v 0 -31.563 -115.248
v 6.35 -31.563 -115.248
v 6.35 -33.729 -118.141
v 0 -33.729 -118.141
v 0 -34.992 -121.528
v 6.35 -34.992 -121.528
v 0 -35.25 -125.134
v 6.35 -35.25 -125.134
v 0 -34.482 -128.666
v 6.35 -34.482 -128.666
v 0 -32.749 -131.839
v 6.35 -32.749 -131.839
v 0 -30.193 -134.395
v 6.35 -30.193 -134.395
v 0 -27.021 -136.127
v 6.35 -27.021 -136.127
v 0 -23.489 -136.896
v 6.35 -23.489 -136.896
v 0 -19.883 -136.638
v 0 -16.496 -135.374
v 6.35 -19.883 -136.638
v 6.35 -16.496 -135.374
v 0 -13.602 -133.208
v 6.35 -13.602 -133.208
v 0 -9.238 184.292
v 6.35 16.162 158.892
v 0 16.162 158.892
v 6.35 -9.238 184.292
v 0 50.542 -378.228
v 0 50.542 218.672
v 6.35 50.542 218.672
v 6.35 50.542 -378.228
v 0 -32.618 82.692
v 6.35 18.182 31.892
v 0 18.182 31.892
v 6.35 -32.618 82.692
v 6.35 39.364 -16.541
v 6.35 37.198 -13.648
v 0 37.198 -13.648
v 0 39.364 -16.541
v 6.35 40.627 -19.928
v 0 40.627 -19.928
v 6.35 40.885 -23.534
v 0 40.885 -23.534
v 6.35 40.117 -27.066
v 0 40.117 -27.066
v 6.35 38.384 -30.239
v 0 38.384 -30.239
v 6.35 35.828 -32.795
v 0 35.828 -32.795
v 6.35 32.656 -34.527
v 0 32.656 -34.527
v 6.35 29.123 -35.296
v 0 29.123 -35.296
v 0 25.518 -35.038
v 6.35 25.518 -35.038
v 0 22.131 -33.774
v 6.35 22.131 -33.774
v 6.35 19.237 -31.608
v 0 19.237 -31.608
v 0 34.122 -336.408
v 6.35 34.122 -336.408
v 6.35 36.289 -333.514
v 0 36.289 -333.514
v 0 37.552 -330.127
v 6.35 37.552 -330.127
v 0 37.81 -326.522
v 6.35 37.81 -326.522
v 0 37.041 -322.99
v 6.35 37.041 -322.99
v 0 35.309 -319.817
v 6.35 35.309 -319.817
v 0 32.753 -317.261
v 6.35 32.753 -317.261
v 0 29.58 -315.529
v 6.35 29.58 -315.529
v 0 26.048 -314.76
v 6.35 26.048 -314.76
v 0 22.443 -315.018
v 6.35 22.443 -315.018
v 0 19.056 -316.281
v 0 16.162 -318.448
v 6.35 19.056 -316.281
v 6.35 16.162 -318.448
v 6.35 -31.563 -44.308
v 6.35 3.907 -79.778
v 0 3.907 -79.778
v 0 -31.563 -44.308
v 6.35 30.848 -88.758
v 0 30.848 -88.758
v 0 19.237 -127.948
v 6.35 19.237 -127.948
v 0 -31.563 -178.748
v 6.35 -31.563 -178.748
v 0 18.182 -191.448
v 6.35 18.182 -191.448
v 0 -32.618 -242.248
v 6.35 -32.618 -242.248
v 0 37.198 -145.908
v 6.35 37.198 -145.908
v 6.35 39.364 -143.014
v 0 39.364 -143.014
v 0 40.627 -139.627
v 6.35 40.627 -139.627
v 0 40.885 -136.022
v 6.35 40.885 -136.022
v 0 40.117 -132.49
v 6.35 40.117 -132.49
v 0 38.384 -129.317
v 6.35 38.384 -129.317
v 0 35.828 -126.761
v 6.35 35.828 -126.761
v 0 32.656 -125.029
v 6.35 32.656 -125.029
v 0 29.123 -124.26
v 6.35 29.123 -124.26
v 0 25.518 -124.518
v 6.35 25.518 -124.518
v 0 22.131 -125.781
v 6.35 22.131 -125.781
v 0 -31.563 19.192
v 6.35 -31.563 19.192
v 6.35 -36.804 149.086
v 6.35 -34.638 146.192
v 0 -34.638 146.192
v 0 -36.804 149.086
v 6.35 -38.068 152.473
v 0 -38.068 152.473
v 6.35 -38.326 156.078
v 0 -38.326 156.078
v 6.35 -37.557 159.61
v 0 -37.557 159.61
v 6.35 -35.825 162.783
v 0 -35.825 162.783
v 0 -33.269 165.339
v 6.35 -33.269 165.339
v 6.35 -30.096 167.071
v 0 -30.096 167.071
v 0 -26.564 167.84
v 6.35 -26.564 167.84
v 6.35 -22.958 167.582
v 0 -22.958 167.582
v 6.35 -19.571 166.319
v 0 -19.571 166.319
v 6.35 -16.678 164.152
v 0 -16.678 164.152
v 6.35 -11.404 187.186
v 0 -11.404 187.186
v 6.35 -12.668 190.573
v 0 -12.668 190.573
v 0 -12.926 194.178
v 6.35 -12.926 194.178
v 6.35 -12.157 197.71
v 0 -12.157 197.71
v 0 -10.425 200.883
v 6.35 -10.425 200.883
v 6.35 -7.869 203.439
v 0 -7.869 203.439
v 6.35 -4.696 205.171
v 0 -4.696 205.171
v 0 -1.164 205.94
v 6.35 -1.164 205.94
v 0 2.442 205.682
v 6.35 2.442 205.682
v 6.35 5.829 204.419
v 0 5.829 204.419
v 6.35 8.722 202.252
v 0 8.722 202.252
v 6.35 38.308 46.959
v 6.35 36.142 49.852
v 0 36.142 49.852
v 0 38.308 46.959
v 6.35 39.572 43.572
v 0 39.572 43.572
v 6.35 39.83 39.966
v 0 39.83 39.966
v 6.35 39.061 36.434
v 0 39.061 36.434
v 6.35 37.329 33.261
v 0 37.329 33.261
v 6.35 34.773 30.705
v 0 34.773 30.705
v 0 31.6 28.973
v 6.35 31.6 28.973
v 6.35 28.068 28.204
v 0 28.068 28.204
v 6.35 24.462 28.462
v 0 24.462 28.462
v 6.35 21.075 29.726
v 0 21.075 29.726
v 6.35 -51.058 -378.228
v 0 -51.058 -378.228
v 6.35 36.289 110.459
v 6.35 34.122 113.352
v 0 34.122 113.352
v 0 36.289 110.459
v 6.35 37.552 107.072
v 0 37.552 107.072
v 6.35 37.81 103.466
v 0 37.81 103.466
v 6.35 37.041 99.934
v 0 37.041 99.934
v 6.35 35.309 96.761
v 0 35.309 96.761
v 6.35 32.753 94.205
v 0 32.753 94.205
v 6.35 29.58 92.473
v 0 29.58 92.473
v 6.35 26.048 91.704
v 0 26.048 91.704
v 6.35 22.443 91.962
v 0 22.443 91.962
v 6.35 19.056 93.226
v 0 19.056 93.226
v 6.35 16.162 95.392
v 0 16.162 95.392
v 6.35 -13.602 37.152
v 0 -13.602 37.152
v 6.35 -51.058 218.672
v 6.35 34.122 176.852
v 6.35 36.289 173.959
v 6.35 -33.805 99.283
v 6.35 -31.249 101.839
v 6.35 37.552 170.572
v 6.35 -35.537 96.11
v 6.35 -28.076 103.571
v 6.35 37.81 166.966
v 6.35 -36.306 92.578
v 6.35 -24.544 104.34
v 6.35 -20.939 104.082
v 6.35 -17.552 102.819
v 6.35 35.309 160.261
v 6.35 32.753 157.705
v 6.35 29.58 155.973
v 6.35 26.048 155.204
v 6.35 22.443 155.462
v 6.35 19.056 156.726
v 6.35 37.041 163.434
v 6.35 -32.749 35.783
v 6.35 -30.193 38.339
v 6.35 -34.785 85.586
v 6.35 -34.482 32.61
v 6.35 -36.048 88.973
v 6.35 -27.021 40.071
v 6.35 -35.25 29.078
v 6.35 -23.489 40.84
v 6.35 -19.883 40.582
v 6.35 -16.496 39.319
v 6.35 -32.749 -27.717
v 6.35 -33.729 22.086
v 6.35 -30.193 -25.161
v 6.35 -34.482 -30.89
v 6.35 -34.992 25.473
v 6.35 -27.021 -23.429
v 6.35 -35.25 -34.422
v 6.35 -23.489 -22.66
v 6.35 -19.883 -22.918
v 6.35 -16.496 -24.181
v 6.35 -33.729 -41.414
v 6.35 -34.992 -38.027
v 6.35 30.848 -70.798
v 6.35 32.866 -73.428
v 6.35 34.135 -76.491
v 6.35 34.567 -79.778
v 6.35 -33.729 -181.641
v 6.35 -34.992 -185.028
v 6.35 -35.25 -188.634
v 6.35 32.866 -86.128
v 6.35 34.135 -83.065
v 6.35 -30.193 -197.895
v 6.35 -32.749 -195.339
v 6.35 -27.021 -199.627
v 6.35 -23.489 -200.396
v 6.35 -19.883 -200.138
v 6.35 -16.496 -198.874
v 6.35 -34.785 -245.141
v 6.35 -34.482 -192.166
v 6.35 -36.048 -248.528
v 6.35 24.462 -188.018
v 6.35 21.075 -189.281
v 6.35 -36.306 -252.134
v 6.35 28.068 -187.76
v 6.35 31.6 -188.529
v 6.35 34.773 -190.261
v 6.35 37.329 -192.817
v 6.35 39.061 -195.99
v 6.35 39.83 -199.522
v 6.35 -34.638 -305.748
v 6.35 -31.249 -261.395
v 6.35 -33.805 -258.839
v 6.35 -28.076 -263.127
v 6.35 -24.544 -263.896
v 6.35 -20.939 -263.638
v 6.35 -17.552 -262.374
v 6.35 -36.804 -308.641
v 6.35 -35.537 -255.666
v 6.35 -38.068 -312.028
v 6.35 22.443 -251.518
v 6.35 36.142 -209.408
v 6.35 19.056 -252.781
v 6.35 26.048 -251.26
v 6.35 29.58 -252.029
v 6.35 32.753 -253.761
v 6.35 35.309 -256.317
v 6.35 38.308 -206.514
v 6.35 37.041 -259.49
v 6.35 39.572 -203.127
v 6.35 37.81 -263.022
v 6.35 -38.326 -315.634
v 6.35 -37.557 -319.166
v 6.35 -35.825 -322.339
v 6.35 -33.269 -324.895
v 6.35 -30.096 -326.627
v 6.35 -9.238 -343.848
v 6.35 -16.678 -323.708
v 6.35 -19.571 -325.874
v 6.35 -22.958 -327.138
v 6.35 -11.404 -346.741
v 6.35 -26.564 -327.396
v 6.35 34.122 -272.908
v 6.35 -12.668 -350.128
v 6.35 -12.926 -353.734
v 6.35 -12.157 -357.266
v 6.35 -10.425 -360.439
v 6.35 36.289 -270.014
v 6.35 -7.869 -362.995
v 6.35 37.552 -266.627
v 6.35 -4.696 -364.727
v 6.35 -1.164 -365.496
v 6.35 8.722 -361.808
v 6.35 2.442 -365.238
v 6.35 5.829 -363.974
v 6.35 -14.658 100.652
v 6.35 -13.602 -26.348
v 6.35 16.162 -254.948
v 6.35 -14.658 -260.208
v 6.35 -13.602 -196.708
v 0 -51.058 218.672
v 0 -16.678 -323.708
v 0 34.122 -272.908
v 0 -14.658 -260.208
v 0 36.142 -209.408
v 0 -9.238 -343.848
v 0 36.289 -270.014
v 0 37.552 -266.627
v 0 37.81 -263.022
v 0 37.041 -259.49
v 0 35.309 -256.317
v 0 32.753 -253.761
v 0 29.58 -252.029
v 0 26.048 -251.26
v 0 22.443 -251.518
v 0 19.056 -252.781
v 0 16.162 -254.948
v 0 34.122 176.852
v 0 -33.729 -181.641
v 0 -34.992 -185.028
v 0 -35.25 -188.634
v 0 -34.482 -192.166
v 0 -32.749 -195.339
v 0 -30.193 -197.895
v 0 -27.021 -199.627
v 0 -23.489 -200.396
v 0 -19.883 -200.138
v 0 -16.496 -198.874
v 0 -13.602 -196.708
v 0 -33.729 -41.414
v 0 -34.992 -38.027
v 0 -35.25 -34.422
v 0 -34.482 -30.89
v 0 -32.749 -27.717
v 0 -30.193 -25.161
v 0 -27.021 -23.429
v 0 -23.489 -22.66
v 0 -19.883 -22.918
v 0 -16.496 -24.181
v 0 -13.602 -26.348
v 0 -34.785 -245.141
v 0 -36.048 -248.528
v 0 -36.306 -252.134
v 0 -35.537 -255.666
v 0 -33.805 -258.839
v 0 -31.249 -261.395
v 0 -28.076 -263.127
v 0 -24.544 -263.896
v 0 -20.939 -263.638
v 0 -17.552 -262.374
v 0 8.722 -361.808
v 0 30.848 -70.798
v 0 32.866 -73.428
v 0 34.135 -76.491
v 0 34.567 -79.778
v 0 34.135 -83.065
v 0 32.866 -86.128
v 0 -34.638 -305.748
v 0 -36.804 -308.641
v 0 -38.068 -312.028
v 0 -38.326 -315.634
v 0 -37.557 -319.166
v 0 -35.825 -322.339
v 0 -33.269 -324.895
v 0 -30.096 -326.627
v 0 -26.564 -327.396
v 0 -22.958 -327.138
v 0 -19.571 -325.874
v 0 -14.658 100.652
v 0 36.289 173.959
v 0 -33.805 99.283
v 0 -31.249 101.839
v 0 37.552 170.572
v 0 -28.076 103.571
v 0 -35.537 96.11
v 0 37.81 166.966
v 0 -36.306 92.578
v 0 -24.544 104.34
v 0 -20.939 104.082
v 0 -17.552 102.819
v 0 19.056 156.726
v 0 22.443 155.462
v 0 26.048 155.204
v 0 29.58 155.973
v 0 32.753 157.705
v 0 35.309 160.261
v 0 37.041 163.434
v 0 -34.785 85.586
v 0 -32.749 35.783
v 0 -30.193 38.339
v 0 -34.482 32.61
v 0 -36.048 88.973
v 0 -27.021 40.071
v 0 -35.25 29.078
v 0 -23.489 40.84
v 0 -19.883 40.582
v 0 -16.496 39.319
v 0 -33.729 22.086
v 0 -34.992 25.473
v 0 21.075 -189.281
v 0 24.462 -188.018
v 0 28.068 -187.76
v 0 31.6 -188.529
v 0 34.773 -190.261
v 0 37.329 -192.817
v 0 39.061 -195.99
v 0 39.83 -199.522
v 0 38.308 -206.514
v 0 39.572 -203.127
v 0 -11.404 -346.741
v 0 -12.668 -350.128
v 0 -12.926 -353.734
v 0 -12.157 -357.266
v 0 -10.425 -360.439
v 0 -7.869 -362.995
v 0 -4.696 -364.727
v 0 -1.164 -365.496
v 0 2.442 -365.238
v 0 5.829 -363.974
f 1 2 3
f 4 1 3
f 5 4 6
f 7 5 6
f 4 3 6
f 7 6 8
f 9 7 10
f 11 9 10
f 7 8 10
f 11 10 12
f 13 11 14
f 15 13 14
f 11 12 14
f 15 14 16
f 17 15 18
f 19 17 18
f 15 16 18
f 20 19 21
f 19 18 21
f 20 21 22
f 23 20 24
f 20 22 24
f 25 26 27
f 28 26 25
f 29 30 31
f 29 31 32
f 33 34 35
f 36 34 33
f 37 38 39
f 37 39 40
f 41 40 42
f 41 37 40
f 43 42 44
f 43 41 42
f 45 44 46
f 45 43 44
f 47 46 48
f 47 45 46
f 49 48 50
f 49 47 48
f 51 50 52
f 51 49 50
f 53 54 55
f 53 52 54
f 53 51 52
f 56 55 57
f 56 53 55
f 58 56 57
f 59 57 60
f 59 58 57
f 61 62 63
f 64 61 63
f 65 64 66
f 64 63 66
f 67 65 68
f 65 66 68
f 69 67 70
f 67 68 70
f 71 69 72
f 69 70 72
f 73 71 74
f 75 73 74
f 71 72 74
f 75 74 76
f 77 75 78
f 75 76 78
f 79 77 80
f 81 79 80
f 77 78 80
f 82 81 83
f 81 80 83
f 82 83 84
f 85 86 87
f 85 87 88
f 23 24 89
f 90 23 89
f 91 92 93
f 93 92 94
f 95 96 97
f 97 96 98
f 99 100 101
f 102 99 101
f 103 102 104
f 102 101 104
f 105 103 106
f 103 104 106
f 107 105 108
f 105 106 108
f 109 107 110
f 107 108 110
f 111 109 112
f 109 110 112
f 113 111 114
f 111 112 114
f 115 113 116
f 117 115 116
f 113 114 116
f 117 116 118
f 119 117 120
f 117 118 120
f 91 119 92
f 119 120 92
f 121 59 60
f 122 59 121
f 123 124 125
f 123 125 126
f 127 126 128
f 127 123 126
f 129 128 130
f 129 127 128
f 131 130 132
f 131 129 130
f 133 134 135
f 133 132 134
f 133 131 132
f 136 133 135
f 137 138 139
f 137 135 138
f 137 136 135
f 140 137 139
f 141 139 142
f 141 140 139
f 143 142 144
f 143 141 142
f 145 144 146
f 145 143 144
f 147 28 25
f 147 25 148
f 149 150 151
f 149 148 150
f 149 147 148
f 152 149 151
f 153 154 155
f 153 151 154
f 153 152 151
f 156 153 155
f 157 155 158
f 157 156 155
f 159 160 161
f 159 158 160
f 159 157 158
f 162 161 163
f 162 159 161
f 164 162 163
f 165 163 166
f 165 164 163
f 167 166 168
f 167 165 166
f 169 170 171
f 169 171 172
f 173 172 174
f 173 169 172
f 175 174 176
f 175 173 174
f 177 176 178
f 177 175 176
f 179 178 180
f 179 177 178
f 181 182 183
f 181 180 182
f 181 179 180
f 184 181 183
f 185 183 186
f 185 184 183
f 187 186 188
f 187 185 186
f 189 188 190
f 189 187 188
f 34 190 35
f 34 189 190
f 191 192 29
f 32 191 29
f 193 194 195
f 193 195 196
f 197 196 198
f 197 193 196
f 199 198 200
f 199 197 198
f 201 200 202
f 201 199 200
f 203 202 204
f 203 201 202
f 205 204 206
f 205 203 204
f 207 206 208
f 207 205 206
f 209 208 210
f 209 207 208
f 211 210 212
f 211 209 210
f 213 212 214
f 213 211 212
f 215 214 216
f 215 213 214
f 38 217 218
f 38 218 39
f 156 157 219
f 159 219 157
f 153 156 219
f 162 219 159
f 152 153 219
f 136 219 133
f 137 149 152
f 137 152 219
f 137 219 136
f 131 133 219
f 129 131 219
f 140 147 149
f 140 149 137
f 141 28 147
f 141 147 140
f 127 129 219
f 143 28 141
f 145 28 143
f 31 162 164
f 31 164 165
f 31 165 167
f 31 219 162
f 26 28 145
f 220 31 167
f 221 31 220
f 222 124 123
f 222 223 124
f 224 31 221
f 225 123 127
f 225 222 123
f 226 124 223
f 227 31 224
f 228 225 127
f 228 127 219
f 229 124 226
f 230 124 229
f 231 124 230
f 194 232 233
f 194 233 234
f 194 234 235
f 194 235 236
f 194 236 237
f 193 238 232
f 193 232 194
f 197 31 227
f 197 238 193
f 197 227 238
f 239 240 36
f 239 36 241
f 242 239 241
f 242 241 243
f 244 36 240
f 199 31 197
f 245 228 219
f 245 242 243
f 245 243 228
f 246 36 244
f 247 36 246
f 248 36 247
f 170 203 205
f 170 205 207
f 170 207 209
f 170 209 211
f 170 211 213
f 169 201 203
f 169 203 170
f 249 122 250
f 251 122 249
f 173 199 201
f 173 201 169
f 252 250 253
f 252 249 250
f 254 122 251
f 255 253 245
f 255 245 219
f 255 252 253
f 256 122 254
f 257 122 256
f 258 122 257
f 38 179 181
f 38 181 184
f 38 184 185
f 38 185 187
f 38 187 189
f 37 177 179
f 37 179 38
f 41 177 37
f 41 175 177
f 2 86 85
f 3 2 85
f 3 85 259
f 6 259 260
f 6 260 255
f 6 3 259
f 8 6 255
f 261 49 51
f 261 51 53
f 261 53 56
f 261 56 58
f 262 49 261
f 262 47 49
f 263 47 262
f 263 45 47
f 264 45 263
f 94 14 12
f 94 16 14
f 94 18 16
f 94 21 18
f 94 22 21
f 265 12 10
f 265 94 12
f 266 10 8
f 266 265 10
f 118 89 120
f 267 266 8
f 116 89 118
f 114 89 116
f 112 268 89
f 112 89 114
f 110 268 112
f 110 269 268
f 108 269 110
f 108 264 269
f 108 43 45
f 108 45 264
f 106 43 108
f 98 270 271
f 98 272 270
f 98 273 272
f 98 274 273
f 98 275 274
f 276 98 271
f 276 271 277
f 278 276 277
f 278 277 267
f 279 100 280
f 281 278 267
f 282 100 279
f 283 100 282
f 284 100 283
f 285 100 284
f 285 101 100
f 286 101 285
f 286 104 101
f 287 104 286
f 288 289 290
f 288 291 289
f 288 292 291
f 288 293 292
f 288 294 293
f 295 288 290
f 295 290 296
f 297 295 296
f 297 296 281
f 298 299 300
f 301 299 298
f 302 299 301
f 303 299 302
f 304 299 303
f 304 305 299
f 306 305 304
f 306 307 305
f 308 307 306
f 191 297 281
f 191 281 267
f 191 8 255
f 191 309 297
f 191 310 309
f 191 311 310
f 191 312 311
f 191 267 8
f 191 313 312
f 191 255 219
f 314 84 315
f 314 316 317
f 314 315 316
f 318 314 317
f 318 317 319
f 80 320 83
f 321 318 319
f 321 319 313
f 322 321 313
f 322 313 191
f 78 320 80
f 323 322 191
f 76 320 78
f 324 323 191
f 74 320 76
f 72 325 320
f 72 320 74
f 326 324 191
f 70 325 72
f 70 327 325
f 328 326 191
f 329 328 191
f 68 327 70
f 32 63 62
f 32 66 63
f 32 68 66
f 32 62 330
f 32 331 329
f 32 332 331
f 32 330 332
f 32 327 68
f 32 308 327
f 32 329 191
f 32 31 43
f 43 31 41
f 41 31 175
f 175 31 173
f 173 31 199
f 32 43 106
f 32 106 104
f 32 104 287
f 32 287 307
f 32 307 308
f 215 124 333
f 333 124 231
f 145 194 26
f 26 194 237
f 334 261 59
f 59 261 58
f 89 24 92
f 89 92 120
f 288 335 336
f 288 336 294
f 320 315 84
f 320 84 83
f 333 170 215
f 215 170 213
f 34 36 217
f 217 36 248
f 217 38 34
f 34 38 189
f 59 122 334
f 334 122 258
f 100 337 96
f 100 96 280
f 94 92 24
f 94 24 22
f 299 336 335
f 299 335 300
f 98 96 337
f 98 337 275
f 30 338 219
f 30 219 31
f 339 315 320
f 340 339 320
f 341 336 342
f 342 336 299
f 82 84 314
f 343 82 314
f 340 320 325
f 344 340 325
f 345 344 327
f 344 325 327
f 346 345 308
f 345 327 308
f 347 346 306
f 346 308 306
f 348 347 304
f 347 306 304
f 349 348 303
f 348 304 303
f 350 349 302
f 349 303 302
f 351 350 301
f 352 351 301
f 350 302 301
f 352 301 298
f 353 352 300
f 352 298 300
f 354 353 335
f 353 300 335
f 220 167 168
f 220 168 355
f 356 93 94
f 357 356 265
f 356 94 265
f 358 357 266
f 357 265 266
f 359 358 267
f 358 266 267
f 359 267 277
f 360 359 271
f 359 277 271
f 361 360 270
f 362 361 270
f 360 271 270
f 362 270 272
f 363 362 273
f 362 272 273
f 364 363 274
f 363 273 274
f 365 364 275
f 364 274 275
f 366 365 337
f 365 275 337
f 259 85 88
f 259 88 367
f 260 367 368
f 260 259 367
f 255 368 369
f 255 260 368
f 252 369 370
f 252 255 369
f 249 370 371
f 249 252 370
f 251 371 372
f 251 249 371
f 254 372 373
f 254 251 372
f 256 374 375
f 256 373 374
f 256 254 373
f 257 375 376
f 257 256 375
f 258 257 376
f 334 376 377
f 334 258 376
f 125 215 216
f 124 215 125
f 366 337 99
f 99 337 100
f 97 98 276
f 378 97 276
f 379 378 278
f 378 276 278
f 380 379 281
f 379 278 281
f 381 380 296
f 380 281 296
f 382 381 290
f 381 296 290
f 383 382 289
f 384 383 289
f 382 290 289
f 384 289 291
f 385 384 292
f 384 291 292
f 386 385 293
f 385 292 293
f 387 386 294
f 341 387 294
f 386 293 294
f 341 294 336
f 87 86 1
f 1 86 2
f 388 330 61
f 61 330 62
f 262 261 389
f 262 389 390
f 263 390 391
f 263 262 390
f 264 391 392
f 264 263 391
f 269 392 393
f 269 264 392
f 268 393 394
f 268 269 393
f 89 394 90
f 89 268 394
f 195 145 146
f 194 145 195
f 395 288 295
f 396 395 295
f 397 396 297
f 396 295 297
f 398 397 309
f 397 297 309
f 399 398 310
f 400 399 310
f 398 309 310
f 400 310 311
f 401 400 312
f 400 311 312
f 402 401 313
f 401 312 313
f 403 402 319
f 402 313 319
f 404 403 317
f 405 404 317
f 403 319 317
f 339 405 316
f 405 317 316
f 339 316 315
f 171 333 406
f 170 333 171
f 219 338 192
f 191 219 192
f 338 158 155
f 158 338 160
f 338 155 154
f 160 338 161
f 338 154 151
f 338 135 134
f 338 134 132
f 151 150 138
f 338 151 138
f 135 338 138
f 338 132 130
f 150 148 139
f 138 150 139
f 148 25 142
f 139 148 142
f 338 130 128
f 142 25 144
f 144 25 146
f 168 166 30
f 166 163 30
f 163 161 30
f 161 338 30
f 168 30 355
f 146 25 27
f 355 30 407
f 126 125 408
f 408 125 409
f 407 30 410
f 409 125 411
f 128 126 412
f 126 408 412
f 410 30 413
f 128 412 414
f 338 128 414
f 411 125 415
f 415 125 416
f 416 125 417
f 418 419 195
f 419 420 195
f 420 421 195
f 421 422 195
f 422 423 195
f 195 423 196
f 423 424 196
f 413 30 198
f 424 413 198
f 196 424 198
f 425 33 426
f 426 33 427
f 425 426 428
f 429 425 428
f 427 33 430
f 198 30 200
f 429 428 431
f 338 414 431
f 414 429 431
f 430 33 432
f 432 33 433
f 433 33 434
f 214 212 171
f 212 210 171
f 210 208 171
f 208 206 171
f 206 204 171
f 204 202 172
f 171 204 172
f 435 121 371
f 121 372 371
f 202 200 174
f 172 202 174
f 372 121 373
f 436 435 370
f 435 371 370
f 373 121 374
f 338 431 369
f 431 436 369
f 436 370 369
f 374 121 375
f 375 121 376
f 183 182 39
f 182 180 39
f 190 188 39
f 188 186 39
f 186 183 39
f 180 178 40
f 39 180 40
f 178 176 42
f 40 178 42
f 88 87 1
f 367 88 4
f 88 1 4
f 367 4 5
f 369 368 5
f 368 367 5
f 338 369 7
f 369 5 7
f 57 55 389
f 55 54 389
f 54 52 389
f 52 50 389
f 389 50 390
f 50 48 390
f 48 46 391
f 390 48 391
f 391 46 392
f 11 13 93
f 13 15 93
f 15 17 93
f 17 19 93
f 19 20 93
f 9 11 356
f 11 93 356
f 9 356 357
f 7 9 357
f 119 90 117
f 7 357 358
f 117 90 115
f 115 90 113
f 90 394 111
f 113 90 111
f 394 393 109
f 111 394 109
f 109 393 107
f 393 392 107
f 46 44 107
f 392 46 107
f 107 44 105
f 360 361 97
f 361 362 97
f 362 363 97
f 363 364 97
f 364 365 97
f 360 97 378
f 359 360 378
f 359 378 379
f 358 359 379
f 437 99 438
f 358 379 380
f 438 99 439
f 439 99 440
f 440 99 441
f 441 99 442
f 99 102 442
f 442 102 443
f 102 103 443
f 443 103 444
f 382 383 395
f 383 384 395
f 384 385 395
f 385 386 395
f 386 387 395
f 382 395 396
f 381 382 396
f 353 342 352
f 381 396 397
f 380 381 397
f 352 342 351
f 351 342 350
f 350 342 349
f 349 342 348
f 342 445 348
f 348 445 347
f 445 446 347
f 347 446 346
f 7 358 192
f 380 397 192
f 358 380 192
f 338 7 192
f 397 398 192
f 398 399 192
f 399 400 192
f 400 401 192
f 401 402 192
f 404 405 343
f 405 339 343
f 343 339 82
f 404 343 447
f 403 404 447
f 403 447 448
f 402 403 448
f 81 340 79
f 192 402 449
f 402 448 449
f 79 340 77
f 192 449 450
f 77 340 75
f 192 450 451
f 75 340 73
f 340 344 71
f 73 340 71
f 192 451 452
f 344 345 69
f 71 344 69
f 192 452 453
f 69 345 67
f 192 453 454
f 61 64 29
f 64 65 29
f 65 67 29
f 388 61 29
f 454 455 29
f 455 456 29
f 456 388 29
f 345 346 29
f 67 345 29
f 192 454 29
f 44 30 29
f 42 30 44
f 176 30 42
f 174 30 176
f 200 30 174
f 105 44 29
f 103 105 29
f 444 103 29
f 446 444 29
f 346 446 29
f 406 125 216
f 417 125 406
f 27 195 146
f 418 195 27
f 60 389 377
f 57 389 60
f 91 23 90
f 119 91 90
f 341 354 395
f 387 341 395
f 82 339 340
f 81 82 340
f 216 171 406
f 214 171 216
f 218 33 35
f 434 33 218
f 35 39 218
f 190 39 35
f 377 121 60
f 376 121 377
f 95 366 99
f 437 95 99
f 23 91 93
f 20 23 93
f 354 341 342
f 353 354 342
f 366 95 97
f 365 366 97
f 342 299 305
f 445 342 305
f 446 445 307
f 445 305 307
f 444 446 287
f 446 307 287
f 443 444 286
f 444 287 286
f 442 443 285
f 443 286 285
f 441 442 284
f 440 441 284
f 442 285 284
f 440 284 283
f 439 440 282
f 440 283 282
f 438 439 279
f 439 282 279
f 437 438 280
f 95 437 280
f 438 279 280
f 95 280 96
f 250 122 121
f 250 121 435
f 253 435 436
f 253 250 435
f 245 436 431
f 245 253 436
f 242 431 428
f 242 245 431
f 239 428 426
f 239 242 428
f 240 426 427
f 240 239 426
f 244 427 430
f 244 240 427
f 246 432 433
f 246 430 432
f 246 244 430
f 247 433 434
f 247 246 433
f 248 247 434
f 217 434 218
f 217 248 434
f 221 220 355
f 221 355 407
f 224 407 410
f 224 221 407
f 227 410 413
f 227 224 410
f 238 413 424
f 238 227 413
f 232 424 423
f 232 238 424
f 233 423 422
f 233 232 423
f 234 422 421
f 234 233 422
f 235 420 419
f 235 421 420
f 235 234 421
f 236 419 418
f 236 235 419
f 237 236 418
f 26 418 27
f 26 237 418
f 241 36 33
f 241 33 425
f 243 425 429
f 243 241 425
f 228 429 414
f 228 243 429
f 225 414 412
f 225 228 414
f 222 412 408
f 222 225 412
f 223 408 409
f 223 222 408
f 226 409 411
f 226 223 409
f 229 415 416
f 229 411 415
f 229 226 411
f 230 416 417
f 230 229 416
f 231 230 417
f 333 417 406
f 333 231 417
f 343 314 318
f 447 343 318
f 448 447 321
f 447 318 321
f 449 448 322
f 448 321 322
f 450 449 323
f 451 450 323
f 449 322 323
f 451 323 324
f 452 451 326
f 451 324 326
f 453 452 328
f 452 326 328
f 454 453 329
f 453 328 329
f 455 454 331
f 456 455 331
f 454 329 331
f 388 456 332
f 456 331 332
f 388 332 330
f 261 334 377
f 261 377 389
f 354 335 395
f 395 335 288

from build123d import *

# Parameters (mm, degrees)
SKETCH1_W           = 596.9
SKETCH1_H           = 101.6
BOSS_EXTRUDE1_DEPTH = 6.35
CUT_EXTRUDE1_DEPTH  = 382.711392197


with BuildPart() as part:
    # Sketch1 → Boss-Extrude1 (new body)
    with BuildSketch(Plane(origin=(0, 0, 0), x_dir=(0, 0, -1), z_dir=(1, 0, 0))):
        with Locations((79.777918782, -0.25786802)):
            Rectangle(SKETCH1_W, SKETCH1_H)
    extrude(amount=BOSS_EXTRUDE1_DEPTH)

    # Sketch2 → Cut-Extrude1 (cut, through all)
    with BuildSketch(Plane(origin=(6.35, 0, 0), x_dir=(0, 0, -1), z_dir=(1, 0, 0))):
        with BuildLine():
            Line((-184.291825097, -9.238124141), (-158.891825097, 16.161875859))
            ThreePointArc((-158.891825097, 16.161875859), (-158.891825097, 34.122388101), (-176.852337339, 34.122388101))
            Line((-176.852337339, 34.122388101), (-202.252337339, 8.722388101))
            ThreePointArc((-202.252337339, 8.722388101), (-202.252337339, -9.238124141), (-184.291825097, -9.238124141))
        make_face()
        with BuildLine():
            Line((-146.191825097, -34.638124141), (-95.391825097, 16.161875859))
            ThreePointArc((-95.391825097, 16.161875859), (-95.391825097, 34.122388101), (-113.352337339, 34.122388101))
            Line((-113.352337339, 34.122388101), (-164.152337339, -16.677611899))
            ThreePointArc((-164.152337339, -16.677611899), (-164.152337339, -34.638124141), (-146.191825097, -34.638124141))
        make_face()
        with BuildLine():
            Line((-49.852337339, 36.142172524), (-100.652337339, -14.657827476))
            ThreePointArc((-100.652337339, -14.657827476), (-100.652337339, -32.618339718), (-82.691825097, -32.618339718))
            Line((-82.691825097, -32.618339718), (-31.891825097, 18.181660282))
            ThreePointArc((-31.891825097, 18.181660282), (-31.891825097, 36.142172524), (-49.852337339, 36.142172524))
        make_face()
        with BuildLine():
            Line((13.647662661, 37.197640065), (-37.152337339, -13.602359935))
            ThreePointArc((-37.152337339, -13.602359935), (-37.152337339, -31.562872177), (-19.191825097, -31.562872177))
            Line((-19.191825097, -31.562872177), (31.608174903, 19.237127823))
            ThreePointArc((31.608174903, 19.237127823), (31.608174903, 37.197640065), (13.647662661, 37.197640065))
        make_face()
        with BuildLine():
            Line((70.797662661, 30.847640065), (26.347662661, -13.602359935))
            ThreePointArc((26.347662661, -13.602359935), (26.347662661, -31.562872177), (44.308174903, -31.562872177))
            Line((44.308174903, -31.562872177), (79.777918782, 3.906871702))
            Line((79.777918782, 3.906871702), (115.247662661, -31.562872177))
            ThreePointArc((115.247662661, -31.562872177), (133.208174903, -31.562872177), (133.208174903, -13.602359935))
            Line((133.208174903, -13.602359935), (88.758174903, 30.847640065))
            ThreePointArc((88.758174903, 30.847640065), (79.777918782, 34.567383944), (70.797662661, 30.847640065))
        make_face()
        with BuildLine():
            ThreePointArc((178.747662661, -31.562872177), (196.708174903, -31.562872177), (196.708174903, -13.602359935))
            Line((196.708174903, -13.602359935), (145.908174903, 37.197640065))
            ThreePointArc((145.908174903, 37.197640065), (127.947662661, 37.197640065), (127.947662661, 19.237127823))
            Line((127.947662661, 19.237127823), (178.747662661, -31.562872177))
        make_face()
        with BuildLine():
            ThreePointArc((242.247662661, -32.618339718), (260.208174903, -32.618339718), (260.208174903, -14.657827476))
            Line((260.208174903, -14.657827476), (209.408174903, 36.142172524))
            ThreePointArc((209.408174903, 36.142172524), (191.447662661, 36.142172524), (191.447662661, 18.181660282))
            Line((191.447662661, 18.181660282), (242.247662661, -32.618339718))
        make_face()
        with BuildLine():
            ThreePointArc((272.908174903, 34.122388101), (254.947662661, 34.122388101), (254.947662661, 16.161875859))
            Line((254.947662661, 16.161875859), (305.747662661, -34.638124141))
            ThreePointArc((305.747662661, -34.638124141), (323.708174903, -34.638124141), (323.708174903, -16.677611899))
            Line((323.708174903, -16.677611899), (272.908174903, 34.122388101))
        make_face()
        with BuildLine():
            ThreePointArc((336.408174903, 34.122388101), (318.447662661, 34.122388101), (318.447662661, 16.161875859))
            Line((318.447662661, 16.161875859), (343.847662661, -9.238124141))
            ThreePointArc((343.847662661, -9.238124141), (361.808174903, -9.238124141), (361.808174903, 8.722388101))
            Line((361.808174903, 8.722388101), (336.408174903, 34.122388101))
        make_face()
    extrude(amount=-CUT_EXTRUDE1_DEPTH, mode=Mode.SUBTRACT)


solid = part.part
